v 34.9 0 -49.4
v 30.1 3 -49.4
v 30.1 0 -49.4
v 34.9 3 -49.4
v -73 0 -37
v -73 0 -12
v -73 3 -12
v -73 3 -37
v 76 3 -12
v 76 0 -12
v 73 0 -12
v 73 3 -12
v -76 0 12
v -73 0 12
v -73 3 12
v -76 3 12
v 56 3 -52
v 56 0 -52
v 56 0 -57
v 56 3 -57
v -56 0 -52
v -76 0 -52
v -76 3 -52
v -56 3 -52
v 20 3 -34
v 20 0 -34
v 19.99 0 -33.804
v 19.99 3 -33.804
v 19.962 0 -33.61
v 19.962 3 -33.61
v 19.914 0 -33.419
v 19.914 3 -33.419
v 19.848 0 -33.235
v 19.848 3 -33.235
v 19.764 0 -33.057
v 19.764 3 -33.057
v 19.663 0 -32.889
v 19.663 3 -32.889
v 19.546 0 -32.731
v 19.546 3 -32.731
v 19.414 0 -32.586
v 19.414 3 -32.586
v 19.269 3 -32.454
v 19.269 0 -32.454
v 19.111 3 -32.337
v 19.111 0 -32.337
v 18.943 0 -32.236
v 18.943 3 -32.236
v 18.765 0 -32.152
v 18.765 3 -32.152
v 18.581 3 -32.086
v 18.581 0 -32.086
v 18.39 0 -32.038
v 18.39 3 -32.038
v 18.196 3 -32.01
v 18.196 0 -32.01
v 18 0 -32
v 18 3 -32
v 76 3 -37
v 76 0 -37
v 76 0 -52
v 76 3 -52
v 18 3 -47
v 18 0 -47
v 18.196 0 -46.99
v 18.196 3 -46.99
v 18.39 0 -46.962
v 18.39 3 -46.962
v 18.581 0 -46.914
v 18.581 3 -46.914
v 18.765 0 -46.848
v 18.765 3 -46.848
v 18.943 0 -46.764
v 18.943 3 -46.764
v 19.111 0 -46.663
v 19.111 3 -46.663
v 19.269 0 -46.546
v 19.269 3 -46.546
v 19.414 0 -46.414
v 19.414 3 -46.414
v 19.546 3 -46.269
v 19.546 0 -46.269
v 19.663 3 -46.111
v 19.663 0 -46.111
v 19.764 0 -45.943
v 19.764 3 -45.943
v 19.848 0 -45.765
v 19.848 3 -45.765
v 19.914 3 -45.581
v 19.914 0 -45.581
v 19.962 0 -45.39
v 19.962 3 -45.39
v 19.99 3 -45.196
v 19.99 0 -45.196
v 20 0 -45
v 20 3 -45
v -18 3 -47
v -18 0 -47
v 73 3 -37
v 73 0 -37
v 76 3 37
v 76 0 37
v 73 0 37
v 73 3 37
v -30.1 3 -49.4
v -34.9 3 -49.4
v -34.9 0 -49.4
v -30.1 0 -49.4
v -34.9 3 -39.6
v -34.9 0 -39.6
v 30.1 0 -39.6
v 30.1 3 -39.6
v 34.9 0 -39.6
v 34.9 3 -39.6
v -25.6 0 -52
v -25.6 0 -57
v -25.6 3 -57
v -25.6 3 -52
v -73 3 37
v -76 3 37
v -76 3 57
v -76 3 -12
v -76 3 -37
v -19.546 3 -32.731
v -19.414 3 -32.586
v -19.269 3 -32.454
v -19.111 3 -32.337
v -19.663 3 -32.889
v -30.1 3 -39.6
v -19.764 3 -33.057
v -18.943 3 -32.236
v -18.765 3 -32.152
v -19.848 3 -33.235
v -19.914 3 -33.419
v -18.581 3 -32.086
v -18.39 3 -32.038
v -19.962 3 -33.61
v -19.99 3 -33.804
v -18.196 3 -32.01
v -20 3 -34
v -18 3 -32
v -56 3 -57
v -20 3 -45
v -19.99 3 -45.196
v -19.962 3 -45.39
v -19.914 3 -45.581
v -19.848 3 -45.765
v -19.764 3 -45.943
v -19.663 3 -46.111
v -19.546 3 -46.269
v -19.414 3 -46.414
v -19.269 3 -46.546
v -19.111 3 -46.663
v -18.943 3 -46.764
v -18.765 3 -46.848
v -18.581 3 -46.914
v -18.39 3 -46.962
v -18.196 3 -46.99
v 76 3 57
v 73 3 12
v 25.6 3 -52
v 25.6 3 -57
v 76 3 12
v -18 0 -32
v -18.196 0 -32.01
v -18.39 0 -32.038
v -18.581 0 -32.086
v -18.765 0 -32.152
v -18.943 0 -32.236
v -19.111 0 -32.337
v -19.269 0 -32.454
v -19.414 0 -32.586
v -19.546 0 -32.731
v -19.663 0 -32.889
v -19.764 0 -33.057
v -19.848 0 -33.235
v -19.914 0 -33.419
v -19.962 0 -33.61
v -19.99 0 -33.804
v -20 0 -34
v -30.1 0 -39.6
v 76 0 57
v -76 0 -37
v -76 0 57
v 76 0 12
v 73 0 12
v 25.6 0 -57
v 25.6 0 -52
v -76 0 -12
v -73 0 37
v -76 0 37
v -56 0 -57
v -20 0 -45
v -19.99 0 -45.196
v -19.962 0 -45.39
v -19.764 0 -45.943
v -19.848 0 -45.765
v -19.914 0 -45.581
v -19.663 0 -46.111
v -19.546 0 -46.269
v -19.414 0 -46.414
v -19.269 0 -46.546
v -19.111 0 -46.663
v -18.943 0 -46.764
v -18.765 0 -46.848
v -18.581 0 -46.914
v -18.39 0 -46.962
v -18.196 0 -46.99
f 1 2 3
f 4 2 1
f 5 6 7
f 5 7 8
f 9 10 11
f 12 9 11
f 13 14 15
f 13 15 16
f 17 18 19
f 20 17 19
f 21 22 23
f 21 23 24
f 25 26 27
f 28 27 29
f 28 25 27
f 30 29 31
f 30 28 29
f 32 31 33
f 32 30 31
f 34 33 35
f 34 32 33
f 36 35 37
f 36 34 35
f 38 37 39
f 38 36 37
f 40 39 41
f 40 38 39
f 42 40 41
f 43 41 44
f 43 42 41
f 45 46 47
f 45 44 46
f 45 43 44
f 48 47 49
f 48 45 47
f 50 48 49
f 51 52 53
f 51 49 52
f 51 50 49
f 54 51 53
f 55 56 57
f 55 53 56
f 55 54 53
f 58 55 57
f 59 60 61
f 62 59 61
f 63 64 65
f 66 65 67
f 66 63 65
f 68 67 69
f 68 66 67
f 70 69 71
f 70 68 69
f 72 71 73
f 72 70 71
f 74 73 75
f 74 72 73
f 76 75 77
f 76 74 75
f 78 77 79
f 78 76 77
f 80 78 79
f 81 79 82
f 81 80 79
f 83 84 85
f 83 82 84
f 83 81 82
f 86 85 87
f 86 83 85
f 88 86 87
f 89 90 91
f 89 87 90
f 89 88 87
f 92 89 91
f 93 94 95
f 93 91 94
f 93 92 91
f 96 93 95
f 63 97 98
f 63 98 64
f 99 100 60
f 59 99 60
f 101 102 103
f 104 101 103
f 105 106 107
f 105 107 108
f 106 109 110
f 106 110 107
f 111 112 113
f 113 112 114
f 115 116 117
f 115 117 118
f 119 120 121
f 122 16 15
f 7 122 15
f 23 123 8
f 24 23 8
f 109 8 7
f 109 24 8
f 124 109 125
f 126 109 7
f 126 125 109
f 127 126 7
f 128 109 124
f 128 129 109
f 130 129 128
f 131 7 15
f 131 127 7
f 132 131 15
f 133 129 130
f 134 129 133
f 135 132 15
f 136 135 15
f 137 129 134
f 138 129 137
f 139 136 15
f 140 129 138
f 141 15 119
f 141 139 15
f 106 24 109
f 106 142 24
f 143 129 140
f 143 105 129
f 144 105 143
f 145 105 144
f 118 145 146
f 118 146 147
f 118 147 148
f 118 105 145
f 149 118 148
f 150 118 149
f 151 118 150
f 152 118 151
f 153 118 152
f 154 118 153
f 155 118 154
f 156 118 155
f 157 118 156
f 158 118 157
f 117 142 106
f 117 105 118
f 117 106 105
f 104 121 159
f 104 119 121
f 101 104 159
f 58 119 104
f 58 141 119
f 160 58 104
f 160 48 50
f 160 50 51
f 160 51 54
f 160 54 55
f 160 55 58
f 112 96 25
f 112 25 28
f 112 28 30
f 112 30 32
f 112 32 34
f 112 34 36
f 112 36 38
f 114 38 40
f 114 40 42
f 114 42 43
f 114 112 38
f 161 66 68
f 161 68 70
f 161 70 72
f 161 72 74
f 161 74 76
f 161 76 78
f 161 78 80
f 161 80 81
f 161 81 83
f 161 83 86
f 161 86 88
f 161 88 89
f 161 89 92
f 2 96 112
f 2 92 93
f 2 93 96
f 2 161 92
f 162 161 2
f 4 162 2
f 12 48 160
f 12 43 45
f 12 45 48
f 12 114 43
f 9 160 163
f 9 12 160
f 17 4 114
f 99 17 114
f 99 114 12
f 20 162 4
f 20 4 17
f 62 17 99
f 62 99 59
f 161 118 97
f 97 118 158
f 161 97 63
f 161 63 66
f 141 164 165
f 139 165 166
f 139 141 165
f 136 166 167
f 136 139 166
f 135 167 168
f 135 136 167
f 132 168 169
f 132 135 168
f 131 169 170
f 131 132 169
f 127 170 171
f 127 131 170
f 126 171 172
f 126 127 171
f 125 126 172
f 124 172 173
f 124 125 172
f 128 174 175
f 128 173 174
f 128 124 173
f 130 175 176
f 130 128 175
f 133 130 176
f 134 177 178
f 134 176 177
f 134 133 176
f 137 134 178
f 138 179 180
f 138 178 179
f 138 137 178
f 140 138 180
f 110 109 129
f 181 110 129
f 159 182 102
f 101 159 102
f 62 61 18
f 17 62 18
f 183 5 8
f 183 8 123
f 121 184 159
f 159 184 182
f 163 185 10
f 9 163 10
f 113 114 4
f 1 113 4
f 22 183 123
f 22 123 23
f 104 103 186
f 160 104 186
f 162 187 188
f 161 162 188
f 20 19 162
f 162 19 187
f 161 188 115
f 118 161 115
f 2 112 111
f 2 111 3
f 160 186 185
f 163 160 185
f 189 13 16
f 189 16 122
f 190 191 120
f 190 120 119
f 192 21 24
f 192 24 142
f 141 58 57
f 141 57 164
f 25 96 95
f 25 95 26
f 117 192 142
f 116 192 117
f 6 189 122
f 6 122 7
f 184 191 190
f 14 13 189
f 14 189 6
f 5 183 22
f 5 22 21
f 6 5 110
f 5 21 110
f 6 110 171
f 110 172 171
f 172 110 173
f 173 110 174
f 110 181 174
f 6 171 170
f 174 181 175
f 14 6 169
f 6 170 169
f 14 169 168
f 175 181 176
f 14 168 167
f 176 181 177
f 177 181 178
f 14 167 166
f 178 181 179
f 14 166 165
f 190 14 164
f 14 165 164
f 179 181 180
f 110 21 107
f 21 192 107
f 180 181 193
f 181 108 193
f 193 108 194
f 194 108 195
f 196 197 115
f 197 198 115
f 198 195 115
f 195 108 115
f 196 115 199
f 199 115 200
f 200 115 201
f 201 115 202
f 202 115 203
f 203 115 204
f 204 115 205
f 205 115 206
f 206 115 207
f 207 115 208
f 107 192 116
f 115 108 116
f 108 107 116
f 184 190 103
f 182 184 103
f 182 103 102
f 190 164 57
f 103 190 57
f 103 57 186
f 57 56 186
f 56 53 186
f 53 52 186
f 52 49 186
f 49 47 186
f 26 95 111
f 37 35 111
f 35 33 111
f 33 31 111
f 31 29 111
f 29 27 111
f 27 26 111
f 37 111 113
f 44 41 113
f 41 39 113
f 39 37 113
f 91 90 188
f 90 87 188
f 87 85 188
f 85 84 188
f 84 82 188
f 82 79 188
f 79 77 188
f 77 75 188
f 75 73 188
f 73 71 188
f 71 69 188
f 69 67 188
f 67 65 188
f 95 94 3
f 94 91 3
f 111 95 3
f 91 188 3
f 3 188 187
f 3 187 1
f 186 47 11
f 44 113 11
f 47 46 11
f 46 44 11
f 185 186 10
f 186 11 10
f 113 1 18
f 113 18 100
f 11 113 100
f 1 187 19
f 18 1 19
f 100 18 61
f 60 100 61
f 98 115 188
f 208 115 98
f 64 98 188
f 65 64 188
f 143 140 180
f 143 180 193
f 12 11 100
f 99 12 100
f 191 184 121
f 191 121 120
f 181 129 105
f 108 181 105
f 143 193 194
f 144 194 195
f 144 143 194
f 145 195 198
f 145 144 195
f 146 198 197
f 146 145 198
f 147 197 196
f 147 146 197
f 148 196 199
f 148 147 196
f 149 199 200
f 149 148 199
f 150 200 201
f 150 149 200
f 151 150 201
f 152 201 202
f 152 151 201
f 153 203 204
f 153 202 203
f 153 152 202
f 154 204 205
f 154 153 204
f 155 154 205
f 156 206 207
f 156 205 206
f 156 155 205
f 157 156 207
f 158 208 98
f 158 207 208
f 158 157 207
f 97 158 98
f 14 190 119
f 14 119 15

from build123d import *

# Parameters (mm, degrees)
BOSS_EXTRUDE1_DEPTH = 3
SKETCH2_W           = 4.8
SKETCH2_H           = 9.8
CUT_EXTRUDE1_DEPTH  = 96.047356618


with BuildPart() as part:
    # Sketch1 → Boss-Extrude1 (new body)
    with BuildSketch(Plane(origin=(0, 0, 0), x_dir=(1, 0, 0), z_dir=(0, 1, 0))):
        Polygon((0, 52), (0, -57), (-76, -57), (-76, -37), (-73, -37), (-73, -12), (-76, -12), (-76, 12), (-73, 12), (-73, 37), (-76, 37), (-76, 52), (-56, 52), (-56, 57), (-25.6, 57), (-25.6, 52), align=None)
    boss_extrude1 = extrude(amount=BOSS_EXTRUDE1_DEPTH)

    # Mirror1: Boss-Extrude1 across plane
    add(boss_extrude1.mirror(Plane(origin=(0, 3, -52), x_dir=(0, 0, 1), z_dir=(-1, 0, 0))))

    # Sketch2 → Cut-Extrude1 (cut, through all)
    with BuildSketch(Plane(origin=(0, 3, 0), x_dir=(1, 0, 0), z_dir=(0, 1, 0))):
        with Locations((-32.5, 44.5)):
            Rectangle(SKETCH2_W, SKETCH2_H)
        with Locations((32.5, 44.5)):
            Rectangle(SKETCH2_W, SKETCH2_H)
        with BuildLine():
            Line((-18, 47), (18, 47))
            ThreePointArc((18, 47), (19.414213562, 46.414213562), (20, 45))
            Line((20, 45), (20, 34))
            ThreePointArc((20, 34), (19.414213562, 32.585786438), (18, 32))
            Line((18, 32), (-18, 32))
            ThreePointArc((-18, 32), (-19.414213562, 32.585786438), (-20, 34))
            Line((-20, 34), (-20, 45))
            ThreePointArc((-20, 45), (-19.414213562, 46.414213562), (-18, 47))
        make_face()
    extrude(amount=-CUT_EXTRUDE1_DEPTH, mode=Mode.SUBTRACT)


solid = part.part
